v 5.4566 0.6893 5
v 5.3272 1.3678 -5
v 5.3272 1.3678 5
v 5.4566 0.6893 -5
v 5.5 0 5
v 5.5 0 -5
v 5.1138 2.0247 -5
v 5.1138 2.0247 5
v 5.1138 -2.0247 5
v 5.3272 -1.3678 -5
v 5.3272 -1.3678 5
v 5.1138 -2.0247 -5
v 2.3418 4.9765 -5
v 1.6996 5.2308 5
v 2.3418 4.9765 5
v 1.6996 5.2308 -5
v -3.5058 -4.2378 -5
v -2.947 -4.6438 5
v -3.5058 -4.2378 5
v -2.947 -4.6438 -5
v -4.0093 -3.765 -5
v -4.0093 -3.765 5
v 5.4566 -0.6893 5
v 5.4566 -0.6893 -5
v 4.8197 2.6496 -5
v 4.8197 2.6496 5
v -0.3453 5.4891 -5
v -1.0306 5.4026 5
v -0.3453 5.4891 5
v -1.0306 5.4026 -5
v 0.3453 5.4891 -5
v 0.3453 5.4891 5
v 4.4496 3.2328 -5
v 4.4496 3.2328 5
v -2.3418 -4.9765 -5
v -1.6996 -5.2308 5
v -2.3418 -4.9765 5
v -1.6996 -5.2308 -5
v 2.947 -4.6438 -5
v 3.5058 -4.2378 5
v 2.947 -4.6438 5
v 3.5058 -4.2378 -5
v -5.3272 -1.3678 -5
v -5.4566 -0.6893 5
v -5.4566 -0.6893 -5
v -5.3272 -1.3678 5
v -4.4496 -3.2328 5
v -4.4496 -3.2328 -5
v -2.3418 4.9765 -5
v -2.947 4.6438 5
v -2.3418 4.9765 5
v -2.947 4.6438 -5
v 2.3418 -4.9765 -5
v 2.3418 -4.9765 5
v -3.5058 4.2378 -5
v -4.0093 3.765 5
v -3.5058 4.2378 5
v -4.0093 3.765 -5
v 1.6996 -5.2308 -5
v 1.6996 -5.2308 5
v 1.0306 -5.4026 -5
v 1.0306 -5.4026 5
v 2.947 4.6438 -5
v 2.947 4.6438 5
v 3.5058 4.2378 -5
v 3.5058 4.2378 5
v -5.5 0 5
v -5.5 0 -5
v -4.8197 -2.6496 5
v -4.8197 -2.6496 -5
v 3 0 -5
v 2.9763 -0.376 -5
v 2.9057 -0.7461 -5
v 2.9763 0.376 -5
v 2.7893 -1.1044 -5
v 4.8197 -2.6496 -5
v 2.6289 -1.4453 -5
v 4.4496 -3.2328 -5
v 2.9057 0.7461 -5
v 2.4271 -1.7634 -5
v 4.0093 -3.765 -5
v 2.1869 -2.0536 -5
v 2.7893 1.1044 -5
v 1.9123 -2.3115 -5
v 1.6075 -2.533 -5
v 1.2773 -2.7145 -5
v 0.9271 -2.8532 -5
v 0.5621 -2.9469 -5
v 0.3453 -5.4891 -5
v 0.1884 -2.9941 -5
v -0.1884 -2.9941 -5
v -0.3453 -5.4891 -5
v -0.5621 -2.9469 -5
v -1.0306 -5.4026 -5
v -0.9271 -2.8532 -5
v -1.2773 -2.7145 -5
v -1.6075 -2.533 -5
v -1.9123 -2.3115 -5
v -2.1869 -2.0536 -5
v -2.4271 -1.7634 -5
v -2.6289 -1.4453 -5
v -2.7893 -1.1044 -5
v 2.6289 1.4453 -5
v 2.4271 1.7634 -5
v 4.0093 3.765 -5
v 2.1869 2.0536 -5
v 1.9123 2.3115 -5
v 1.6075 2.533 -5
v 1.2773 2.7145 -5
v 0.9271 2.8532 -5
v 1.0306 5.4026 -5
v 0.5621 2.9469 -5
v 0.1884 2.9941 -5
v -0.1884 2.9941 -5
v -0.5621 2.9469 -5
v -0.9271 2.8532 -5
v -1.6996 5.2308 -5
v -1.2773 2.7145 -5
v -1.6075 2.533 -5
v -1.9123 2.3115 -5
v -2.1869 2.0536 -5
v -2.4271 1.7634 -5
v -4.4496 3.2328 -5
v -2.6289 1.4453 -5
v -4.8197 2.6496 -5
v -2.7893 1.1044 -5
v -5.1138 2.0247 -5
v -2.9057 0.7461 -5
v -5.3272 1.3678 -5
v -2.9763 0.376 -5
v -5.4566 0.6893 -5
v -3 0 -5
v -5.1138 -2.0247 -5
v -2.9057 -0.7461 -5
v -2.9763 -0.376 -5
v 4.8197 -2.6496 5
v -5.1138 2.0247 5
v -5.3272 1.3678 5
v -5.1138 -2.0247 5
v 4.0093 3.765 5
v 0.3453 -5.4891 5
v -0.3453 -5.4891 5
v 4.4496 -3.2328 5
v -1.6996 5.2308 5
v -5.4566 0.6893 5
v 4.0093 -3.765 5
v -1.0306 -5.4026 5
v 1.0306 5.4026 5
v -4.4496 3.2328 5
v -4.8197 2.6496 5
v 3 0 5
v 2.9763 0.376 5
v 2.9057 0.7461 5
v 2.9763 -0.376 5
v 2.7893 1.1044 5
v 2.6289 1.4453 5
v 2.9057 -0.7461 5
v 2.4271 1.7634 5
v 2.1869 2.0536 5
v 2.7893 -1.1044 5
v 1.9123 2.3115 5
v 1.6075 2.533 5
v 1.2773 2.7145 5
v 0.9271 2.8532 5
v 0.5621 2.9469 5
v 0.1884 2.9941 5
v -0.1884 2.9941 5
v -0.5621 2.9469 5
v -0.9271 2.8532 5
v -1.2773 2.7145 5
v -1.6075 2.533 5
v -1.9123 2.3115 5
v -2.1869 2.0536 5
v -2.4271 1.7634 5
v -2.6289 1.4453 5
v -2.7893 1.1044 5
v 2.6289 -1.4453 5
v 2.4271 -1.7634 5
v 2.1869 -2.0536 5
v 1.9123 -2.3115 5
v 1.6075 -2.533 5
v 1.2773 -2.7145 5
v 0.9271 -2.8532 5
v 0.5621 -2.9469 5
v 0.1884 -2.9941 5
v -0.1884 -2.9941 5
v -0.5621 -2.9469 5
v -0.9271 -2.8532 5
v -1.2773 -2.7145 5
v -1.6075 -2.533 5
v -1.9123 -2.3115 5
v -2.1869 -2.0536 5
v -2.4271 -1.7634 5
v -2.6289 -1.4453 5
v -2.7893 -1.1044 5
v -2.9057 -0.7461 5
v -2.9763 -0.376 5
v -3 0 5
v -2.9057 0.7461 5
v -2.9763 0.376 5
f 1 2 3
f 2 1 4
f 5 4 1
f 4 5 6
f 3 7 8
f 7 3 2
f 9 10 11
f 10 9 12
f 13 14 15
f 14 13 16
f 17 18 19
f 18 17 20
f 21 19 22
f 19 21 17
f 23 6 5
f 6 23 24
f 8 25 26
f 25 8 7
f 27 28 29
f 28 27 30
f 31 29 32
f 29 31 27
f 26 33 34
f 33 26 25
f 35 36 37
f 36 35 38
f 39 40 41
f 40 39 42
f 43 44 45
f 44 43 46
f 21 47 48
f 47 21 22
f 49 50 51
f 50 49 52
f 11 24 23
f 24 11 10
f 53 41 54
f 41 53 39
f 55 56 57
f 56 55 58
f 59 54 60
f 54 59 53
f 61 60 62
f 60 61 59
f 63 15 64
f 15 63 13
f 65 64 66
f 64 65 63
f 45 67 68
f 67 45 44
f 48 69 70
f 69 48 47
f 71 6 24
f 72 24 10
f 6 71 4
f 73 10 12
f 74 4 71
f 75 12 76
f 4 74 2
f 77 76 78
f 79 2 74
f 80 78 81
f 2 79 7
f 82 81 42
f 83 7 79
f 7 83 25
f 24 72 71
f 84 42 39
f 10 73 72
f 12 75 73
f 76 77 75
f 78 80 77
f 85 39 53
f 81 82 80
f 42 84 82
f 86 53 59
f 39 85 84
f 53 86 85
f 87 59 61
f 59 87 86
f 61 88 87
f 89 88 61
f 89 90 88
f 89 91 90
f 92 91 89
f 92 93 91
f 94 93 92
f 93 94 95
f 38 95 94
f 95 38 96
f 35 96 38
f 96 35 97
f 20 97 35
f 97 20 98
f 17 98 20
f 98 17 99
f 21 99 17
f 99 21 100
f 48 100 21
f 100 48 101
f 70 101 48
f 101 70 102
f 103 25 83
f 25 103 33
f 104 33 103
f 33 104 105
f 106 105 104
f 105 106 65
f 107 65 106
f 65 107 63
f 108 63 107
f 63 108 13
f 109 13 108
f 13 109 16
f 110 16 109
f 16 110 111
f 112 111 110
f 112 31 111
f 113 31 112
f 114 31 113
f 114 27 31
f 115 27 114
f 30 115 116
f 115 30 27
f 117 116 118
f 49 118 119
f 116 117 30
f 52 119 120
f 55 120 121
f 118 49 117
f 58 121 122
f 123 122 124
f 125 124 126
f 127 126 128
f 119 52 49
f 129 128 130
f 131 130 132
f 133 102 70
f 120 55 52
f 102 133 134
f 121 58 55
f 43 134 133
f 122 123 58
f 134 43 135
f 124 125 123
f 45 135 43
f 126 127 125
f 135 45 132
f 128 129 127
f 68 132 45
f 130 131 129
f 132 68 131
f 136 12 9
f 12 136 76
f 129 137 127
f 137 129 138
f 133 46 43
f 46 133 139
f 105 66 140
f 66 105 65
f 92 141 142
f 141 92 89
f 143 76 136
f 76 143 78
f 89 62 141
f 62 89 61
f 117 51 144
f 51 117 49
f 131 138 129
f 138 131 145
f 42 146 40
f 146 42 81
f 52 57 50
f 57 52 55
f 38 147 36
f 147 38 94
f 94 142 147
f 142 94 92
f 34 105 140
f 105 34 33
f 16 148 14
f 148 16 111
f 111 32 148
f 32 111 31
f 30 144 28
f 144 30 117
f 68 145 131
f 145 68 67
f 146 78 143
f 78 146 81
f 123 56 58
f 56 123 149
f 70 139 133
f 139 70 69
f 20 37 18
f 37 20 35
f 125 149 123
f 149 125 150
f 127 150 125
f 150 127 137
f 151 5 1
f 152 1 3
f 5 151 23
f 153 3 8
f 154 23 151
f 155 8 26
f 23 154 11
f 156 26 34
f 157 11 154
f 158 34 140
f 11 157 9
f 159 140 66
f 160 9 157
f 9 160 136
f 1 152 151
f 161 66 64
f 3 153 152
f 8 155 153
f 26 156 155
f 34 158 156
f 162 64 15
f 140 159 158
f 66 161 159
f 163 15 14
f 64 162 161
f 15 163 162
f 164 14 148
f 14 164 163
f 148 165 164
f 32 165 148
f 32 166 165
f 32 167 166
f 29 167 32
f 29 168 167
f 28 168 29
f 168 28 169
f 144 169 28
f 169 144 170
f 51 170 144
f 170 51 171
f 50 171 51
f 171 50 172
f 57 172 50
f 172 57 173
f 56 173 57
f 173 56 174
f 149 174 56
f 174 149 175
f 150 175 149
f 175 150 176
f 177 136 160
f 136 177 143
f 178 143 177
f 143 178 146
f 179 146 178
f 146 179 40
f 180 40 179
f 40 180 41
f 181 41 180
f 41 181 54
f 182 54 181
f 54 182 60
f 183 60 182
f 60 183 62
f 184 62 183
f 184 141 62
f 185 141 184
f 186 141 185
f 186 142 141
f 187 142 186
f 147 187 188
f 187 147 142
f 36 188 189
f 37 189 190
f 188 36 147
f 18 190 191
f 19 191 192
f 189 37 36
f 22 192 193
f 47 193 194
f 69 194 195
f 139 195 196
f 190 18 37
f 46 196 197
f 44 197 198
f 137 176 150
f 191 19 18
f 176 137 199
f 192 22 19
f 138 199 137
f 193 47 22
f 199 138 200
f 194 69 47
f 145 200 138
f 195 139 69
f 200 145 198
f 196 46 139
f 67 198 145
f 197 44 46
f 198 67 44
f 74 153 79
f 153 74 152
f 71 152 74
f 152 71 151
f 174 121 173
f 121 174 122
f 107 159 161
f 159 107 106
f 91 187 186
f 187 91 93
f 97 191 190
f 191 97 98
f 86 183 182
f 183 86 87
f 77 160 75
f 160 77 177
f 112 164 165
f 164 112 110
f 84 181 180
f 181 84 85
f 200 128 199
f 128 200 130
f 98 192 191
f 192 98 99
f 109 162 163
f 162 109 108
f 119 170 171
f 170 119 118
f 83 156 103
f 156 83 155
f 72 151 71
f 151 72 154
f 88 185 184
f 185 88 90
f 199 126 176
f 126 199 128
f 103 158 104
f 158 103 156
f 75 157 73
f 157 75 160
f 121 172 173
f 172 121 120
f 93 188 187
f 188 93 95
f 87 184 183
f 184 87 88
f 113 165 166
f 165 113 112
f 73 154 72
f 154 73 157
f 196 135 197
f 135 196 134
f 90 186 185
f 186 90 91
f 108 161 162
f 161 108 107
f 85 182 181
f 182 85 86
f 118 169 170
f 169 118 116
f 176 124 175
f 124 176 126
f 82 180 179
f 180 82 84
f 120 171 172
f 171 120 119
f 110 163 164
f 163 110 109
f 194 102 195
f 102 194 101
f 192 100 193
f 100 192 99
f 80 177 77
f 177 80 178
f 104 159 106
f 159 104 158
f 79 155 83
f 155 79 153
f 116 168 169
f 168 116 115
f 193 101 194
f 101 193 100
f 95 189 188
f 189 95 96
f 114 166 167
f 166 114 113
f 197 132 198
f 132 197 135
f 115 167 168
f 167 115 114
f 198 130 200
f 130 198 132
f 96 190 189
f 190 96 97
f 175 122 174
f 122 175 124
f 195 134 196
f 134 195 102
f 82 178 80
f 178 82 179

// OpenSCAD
$fn = 50;


difference() {
	union() {
		translate(v = [0, 0, -5.0000000000]) {
			cylinder(h = 10, r = 5.5000000000);
		}
	}
	union() {
		translate(v = [0, 0, -100.0000000000]) {
			cylinder(h = 200, r = 3.0000000000);
		}
	}
}
